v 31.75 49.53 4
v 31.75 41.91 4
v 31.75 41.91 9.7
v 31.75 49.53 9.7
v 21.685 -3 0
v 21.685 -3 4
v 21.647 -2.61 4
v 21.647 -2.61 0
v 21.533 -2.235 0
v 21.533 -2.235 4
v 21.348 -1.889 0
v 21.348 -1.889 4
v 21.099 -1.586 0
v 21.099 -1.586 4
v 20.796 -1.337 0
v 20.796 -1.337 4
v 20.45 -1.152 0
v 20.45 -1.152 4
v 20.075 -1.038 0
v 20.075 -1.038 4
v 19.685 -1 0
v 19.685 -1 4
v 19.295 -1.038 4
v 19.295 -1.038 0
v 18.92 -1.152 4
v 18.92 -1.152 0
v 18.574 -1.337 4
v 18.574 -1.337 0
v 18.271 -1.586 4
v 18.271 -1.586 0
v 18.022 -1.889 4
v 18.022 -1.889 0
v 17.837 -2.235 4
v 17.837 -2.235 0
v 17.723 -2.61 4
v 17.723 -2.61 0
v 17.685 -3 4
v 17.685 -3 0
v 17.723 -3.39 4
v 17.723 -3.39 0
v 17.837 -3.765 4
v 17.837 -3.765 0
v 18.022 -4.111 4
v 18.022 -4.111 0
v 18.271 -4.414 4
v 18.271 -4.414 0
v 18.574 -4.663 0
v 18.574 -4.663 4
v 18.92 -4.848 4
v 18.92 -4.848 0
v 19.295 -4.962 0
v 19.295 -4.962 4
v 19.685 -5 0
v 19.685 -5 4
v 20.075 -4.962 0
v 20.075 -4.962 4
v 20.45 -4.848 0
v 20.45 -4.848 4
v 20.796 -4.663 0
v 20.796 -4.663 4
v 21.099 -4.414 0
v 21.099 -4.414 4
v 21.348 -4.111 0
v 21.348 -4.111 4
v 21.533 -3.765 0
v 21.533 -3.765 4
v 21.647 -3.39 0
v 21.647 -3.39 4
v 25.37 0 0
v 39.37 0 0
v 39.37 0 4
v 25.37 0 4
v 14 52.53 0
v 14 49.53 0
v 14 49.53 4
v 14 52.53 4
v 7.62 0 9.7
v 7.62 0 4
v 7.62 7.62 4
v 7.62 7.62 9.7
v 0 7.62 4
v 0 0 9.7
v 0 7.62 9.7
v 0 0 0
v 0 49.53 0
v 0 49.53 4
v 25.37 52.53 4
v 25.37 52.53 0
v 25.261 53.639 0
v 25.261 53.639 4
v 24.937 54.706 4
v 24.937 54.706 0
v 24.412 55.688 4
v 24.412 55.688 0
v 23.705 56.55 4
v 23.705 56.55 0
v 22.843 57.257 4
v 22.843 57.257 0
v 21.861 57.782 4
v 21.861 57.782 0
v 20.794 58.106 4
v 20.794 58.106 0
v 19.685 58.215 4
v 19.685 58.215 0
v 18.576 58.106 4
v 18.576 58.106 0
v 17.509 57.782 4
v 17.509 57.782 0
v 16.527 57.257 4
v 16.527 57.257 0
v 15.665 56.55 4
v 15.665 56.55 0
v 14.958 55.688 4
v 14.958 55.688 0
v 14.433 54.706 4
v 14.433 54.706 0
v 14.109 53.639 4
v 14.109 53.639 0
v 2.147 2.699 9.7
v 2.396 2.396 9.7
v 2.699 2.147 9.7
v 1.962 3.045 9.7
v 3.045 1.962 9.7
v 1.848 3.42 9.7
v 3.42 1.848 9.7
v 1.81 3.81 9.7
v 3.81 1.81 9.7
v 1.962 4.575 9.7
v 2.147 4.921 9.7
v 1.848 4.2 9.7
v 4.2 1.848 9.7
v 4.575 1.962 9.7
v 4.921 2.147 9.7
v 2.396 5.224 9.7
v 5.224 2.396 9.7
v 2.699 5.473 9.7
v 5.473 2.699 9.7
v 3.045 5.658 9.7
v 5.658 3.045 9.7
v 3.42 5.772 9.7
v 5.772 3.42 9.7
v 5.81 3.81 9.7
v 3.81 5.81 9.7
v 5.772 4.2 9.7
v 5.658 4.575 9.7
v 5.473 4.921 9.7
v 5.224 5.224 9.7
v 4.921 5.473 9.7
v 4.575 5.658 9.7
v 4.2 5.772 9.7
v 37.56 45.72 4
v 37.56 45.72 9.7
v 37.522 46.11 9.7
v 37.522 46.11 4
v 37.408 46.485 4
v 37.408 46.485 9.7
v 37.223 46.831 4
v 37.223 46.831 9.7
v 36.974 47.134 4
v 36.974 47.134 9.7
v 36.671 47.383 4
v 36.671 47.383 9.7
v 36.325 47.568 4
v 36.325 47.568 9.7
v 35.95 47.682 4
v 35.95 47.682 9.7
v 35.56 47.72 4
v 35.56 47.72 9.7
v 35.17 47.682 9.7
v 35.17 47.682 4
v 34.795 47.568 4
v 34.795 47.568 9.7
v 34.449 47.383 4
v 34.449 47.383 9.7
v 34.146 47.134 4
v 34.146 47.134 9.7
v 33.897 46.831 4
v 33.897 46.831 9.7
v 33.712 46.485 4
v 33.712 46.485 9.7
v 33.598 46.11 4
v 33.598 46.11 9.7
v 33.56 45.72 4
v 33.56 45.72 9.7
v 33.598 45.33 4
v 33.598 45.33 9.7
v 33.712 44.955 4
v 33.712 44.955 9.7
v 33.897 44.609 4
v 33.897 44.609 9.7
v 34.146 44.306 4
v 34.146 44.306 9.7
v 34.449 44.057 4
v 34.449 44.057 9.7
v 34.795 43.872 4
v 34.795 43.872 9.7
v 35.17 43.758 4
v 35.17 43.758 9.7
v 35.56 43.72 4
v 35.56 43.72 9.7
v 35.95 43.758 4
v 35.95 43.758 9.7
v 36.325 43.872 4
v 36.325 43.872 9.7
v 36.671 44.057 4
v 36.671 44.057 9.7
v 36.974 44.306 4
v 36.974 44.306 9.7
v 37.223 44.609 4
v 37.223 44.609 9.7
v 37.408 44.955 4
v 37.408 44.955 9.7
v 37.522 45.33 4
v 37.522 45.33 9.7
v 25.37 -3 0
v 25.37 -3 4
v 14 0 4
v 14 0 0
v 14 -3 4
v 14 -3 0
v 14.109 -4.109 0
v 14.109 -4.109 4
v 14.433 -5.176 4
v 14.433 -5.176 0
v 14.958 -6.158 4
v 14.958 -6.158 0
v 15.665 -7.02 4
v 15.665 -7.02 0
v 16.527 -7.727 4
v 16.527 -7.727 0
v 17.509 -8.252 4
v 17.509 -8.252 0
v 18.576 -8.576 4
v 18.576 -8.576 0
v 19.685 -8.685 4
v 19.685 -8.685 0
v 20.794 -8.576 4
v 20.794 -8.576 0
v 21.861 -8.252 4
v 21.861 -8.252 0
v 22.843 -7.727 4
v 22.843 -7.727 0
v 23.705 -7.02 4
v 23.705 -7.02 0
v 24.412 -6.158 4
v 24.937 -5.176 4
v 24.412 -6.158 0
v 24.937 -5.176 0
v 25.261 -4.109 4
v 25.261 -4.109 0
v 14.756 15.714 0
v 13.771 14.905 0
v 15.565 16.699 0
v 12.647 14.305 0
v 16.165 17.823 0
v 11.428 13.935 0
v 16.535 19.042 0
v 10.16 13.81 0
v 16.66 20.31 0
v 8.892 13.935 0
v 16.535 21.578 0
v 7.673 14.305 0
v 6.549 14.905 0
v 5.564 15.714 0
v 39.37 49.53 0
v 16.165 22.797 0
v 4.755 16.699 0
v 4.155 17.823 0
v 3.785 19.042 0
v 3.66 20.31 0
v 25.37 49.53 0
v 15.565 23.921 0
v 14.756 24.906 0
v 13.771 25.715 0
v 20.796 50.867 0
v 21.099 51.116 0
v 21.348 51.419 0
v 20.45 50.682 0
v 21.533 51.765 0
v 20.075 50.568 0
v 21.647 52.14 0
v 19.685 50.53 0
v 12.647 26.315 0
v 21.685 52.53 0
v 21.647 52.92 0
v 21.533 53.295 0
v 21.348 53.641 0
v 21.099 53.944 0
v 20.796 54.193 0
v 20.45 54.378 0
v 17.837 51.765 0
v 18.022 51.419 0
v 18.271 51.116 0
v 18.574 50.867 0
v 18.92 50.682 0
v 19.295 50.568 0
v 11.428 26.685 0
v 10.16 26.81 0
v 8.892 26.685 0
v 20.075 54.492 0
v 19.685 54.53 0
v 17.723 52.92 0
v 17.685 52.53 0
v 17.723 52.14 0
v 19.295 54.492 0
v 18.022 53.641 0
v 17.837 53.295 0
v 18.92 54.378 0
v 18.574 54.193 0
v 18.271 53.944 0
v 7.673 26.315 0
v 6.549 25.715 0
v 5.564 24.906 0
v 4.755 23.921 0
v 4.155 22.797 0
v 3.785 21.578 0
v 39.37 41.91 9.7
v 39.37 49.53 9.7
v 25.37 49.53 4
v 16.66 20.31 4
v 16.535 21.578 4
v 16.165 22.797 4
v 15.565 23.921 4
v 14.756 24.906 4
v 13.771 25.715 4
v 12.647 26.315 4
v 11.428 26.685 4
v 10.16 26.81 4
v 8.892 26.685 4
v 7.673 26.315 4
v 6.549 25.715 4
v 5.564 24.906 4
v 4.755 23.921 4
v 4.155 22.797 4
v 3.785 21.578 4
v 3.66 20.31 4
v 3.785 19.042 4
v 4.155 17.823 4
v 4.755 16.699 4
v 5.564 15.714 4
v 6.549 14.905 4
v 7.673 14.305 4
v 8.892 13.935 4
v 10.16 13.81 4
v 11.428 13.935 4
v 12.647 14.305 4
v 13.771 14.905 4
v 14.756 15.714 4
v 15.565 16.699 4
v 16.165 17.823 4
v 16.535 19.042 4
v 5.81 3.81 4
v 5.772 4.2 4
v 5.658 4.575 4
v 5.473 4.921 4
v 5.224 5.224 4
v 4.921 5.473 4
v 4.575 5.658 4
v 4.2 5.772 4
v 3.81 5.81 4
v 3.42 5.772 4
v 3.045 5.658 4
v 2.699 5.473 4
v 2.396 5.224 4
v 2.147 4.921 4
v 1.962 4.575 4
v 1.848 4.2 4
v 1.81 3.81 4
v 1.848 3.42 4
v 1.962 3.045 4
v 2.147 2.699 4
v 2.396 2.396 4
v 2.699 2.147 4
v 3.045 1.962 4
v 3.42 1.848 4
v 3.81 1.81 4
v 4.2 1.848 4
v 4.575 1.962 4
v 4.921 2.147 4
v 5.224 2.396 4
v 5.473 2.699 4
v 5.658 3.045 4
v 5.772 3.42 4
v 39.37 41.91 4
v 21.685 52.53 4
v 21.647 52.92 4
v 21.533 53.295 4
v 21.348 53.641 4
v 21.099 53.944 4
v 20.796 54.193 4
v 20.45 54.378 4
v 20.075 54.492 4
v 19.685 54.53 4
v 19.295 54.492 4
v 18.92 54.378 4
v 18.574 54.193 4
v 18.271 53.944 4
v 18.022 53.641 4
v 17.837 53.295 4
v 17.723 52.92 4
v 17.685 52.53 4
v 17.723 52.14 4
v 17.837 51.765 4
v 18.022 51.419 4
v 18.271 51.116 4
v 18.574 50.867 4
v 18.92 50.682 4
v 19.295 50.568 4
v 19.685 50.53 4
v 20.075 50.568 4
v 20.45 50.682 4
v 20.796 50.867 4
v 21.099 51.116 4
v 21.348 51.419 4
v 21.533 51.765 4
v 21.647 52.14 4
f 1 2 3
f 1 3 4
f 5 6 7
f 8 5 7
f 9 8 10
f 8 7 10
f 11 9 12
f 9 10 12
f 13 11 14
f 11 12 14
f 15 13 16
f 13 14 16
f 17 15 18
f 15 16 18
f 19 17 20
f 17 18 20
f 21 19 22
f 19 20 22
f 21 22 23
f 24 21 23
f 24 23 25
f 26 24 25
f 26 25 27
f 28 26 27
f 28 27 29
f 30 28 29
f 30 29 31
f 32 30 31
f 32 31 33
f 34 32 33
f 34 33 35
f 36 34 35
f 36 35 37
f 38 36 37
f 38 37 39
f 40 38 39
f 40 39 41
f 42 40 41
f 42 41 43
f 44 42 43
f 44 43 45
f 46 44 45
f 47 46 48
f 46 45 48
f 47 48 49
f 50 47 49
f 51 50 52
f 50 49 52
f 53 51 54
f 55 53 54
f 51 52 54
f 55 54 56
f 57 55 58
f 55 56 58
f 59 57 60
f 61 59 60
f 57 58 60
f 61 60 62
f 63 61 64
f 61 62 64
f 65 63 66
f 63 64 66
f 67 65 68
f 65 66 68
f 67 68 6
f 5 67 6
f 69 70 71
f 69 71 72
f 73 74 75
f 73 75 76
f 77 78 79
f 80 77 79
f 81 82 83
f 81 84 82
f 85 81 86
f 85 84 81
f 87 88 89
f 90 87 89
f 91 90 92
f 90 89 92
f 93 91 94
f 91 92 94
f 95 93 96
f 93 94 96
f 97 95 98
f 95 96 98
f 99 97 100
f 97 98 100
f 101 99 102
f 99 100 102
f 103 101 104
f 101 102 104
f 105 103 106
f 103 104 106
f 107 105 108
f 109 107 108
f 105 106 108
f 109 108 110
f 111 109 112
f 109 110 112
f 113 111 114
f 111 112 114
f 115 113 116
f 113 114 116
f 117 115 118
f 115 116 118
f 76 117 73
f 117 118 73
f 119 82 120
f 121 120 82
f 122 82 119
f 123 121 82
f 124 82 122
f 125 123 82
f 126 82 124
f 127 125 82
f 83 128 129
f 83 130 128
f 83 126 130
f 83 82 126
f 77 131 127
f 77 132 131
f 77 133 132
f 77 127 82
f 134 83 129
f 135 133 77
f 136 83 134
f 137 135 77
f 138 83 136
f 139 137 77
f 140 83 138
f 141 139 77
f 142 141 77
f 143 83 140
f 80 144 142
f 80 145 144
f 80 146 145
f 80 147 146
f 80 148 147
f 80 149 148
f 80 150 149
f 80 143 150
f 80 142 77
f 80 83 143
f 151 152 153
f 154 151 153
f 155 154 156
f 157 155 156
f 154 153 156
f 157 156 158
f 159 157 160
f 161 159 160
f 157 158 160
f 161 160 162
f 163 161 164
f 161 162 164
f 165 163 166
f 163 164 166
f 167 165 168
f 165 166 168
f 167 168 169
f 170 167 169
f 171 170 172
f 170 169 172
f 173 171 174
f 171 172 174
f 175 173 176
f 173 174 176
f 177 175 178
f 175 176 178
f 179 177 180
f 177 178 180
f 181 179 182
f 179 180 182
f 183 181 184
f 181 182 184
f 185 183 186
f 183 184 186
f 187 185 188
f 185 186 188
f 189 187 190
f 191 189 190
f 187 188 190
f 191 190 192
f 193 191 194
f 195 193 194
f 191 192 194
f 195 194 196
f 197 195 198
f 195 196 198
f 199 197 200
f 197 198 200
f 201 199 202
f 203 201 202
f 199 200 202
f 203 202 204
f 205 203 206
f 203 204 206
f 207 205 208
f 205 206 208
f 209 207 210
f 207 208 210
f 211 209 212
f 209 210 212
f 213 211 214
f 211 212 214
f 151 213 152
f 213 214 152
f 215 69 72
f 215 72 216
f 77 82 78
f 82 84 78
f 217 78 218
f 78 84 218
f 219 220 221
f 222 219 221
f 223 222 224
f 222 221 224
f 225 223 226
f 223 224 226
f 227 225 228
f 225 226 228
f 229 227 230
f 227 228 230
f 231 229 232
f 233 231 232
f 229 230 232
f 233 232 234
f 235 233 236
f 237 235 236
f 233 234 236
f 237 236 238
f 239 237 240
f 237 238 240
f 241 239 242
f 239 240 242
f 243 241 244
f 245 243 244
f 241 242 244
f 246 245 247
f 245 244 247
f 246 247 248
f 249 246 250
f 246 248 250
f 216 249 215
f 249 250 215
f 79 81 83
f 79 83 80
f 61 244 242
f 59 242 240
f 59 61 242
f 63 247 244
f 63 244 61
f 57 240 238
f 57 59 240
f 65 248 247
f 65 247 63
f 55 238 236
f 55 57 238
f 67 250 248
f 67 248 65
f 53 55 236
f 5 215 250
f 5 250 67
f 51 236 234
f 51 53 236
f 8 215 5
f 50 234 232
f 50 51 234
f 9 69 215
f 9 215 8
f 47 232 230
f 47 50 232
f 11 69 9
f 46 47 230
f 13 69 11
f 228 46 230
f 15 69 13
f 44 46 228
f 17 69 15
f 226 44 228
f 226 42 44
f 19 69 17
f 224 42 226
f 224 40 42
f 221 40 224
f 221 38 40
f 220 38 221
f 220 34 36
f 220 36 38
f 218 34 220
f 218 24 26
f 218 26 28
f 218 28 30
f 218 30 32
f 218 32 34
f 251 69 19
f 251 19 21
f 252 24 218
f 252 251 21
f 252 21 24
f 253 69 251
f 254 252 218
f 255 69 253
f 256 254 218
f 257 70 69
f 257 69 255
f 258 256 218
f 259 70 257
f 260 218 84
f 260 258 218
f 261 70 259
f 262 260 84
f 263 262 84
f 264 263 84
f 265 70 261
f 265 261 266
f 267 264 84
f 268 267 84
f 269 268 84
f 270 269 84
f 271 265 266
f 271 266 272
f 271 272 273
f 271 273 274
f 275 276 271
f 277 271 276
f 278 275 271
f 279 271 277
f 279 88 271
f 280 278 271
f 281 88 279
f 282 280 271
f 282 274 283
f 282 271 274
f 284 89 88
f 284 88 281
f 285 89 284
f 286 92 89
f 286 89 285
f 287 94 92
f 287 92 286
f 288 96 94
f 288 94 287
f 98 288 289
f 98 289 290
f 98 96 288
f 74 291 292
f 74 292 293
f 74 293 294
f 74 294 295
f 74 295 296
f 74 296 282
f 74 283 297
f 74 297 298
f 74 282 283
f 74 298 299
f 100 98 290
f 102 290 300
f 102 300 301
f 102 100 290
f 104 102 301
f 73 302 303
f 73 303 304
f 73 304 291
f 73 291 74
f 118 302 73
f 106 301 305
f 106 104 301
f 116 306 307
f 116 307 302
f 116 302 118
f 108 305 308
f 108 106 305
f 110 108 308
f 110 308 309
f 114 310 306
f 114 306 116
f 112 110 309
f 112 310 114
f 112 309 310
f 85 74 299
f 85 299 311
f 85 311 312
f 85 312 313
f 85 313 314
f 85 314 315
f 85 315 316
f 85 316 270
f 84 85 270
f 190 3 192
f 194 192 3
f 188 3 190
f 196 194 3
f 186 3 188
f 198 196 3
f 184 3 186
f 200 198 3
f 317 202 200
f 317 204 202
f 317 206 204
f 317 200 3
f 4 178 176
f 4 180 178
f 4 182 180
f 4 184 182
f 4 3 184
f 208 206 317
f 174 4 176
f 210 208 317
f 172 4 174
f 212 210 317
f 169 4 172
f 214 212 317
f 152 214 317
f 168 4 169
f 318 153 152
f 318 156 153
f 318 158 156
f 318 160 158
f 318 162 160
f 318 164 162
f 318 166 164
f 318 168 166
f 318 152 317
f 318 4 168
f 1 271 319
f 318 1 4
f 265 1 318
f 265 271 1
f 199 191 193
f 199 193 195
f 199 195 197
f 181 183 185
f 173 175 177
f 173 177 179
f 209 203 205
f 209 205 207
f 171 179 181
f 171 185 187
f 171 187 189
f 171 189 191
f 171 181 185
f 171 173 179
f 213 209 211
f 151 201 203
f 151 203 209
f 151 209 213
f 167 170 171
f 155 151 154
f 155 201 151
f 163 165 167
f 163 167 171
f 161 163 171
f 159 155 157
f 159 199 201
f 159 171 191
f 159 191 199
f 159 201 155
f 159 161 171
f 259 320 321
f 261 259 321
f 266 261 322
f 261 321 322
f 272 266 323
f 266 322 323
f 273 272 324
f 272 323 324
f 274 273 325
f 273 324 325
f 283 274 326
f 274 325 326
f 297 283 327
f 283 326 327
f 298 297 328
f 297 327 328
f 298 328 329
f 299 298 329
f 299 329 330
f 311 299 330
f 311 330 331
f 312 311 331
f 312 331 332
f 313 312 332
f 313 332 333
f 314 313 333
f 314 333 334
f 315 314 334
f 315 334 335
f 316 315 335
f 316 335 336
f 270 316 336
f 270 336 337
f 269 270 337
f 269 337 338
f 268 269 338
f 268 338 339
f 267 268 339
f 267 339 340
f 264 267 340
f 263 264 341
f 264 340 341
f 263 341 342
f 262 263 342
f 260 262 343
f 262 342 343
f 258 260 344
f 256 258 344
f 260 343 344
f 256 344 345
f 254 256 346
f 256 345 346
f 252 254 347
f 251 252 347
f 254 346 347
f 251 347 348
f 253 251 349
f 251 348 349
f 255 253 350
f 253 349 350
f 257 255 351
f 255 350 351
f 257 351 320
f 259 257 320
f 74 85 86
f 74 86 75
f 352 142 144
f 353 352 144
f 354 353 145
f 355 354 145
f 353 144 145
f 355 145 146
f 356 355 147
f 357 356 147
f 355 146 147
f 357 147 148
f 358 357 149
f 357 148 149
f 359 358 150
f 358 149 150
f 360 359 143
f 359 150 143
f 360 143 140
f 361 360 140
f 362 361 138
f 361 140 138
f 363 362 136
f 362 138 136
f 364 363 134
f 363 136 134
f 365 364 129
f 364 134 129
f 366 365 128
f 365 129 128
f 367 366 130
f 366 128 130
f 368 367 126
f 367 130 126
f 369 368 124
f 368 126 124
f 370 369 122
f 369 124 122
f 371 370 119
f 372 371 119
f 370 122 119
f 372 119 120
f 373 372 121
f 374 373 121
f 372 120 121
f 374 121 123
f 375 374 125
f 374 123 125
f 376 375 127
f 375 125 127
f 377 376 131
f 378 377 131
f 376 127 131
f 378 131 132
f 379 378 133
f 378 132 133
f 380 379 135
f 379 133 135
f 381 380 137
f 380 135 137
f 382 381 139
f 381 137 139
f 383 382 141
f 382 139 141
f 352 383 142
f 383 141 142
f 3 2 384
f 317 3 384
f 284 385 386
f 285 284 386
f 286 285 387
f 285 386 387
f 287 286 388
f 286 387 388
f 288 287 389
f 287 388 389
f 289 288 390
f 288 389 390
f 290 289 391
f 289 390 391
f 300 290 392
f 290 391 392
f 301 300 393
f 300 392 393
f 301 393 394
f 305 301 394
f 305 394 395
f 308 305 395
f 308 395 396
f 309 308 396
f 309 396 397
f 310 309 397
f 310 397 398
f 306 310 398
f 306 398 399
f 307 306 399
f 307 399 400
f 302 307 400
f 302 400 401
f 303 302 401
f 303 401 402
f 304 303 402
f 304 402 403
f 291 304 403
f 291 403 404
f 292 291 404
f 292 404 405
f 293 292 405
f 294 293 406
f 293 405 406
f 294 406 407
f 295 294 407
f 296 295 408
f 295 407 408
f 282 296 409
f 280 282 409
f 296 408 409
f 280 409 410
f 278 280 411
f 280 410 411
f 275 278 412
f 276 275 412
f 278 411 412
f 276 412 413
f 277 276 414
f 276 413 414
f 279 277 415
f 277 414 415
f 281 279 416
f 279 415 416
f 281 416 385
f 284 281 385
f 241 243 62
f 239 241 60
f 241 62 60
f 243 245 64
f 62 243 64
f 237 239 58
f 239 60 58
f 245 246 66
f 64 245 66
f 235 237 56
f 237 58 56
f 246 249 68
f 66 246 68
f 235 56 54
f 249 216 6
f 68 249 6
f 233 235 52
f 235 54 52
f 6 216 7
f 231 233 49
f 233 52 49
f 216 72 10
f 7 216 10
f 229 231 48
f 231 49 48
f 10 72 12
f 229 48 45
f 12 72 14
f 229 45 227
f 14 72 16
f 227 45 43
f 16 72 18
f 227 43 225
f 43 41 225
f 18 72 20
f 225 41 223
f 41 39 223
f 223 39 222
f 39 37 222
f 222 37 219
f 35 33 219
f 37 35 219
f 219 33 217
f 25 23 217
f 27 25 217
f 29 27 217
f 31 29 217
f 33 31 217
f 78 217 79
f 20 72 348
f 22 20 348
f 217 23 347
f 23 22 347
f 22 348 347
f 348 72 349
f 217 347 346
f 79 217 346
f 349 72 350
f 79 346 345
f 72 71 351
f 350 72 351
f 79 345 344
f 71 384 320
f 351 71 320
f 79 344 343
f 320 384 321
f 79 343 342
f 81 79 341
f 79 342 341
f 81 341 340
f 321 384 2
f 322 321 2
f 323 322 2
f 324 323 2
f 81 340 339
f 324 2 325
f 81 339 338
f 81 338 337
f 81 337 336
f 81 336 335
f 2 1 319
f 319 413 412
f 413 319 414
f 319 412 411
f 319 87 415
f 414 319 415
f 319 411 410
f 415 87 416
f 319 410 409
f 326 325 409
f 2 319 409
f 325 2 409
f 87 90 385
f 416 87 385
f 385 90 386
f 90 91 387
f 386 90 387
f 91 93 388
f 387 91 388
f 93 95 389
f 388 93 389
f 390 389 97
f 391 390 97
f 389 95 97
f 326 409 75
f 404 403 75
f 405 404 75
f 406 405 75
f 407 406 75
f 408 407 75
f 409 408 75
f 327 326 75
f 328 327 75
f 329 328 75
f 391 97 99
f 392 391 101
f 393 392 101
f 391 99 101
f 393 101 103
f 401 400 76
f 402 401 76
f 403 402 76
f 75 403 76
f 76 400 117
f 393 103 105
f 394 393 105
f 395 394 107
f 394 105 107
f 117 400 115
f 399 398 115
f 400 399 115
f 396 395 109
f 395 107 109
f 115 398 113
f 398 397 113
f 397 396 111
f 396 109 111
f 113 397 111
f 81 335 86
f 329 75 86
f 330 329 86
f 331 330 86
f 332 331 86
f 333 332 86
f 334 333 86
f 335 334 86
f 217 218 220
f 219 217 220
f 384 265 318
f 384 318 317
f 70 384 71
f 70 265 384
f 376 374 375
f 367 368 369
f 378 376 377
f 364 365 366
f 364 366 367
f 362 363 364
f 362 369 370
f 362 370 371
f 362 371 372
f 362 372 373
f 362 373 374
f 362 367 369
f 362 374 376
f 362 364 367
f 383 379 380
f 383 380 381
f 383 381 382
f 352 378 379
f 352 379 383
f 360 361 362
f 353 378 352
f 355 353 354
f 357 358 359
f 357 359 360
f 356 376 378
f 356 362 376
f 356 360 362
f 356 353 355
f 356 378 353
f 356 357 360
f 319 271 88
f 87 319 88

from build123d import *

# Parameters (mm, degrees)
PAD_DEPTH       = 4
SKETCH001_R     = 6.5
POCKET_DEPTH    = 5
SKETCH002_W     = 7.62
SKETCH002_H     = 7.62
PAD001_DEPTH    = 5.7
SKETCH003_R     = 2
POCKET001_DEPTH = 5.7
SKETCH004_R     = 2
POCKET002_DEPTH = 5


with BuildPart() as part:
    # Sketch → Pad (new body)
    with BuildSketch(Plane.XY):
        with BuildLine():
            Line((0, 0), (0, 49.53))
            Line((0, 49.53), (14, 49.53))
            Line((14, 49.53), (14, 52.53))
            ThreePointArc((25.37, 52.53), (19.685, 58.215), (14, 52.53))
            Line((25.37, 49.53), (25.37, 52.53))
            Line((25.37, 49.53), (39.37, 49.53))
            Line((39.37, 49.53), (39.37, 0))
            Line((39.37, 0), (25.37, 0))
            Line((25.37, 0), (25.37, -3))
            ThreePointArc((14, -3), (19.685, -8.685027), (25.37, -3))
            Line((14, 0), (14, -3))
            Line((0, 0), (14, 0))
        make_face()
    extrude(amount=PAD_DEPTH)

    # Sketch001 (on Face14 of Pad) → Pocket (cut)
    with BuildSketch(Plane.XY.offset(4)):
        with Locations((10.16, 20.31)):
            Circle(SKETCH001_R)
    extrude(amount=-POCKET_DEPTH, mode=Mode.SUBTRACT)

    # Sketch002 (on Face5 of Pocket) → Pad001 (join)
    with BuildSketch(Plane.XY.offset(4)):
        with Locations((3.81, 3.81)):
            Rectangle(SKETCH002_W, SKETCH002_H)
        with Locations((35.56, 45.72)):
            Rectangle(SKETCH002_W, SKETCH002_H)
    extrude(amount=PAD001_DEPTH)

    # Sketch003 (on Face19 of Pad001) → Pocket001 (cut)
    with BuildSketch(Plane.XY.offset(9.7)):
        with Locations((3.81, 3.81)):
            Circle(SKETCH003_R)
        with Locations((35.56, 45.72)):
            Circle(SKETCH003_R)
    extrude(amount=-POCKET001_DEPTH, mode=Mode.SUBTRACT)

    # Sketch004 (on Face6 of Pocket001) → Pocket002 (cut)
    with BuildSketch(Plane.XY.offset(4)):
        with Locations((19.685, -3.000027)):
            Circle(SKETCH004_R)
        with Locations((19.685, 52.53)):
            Circle(SKETCH004_R)
    extrude(amount=-POCKET002_DEPTH, mode=Mode.SUBTRACT)


solid = part.part
